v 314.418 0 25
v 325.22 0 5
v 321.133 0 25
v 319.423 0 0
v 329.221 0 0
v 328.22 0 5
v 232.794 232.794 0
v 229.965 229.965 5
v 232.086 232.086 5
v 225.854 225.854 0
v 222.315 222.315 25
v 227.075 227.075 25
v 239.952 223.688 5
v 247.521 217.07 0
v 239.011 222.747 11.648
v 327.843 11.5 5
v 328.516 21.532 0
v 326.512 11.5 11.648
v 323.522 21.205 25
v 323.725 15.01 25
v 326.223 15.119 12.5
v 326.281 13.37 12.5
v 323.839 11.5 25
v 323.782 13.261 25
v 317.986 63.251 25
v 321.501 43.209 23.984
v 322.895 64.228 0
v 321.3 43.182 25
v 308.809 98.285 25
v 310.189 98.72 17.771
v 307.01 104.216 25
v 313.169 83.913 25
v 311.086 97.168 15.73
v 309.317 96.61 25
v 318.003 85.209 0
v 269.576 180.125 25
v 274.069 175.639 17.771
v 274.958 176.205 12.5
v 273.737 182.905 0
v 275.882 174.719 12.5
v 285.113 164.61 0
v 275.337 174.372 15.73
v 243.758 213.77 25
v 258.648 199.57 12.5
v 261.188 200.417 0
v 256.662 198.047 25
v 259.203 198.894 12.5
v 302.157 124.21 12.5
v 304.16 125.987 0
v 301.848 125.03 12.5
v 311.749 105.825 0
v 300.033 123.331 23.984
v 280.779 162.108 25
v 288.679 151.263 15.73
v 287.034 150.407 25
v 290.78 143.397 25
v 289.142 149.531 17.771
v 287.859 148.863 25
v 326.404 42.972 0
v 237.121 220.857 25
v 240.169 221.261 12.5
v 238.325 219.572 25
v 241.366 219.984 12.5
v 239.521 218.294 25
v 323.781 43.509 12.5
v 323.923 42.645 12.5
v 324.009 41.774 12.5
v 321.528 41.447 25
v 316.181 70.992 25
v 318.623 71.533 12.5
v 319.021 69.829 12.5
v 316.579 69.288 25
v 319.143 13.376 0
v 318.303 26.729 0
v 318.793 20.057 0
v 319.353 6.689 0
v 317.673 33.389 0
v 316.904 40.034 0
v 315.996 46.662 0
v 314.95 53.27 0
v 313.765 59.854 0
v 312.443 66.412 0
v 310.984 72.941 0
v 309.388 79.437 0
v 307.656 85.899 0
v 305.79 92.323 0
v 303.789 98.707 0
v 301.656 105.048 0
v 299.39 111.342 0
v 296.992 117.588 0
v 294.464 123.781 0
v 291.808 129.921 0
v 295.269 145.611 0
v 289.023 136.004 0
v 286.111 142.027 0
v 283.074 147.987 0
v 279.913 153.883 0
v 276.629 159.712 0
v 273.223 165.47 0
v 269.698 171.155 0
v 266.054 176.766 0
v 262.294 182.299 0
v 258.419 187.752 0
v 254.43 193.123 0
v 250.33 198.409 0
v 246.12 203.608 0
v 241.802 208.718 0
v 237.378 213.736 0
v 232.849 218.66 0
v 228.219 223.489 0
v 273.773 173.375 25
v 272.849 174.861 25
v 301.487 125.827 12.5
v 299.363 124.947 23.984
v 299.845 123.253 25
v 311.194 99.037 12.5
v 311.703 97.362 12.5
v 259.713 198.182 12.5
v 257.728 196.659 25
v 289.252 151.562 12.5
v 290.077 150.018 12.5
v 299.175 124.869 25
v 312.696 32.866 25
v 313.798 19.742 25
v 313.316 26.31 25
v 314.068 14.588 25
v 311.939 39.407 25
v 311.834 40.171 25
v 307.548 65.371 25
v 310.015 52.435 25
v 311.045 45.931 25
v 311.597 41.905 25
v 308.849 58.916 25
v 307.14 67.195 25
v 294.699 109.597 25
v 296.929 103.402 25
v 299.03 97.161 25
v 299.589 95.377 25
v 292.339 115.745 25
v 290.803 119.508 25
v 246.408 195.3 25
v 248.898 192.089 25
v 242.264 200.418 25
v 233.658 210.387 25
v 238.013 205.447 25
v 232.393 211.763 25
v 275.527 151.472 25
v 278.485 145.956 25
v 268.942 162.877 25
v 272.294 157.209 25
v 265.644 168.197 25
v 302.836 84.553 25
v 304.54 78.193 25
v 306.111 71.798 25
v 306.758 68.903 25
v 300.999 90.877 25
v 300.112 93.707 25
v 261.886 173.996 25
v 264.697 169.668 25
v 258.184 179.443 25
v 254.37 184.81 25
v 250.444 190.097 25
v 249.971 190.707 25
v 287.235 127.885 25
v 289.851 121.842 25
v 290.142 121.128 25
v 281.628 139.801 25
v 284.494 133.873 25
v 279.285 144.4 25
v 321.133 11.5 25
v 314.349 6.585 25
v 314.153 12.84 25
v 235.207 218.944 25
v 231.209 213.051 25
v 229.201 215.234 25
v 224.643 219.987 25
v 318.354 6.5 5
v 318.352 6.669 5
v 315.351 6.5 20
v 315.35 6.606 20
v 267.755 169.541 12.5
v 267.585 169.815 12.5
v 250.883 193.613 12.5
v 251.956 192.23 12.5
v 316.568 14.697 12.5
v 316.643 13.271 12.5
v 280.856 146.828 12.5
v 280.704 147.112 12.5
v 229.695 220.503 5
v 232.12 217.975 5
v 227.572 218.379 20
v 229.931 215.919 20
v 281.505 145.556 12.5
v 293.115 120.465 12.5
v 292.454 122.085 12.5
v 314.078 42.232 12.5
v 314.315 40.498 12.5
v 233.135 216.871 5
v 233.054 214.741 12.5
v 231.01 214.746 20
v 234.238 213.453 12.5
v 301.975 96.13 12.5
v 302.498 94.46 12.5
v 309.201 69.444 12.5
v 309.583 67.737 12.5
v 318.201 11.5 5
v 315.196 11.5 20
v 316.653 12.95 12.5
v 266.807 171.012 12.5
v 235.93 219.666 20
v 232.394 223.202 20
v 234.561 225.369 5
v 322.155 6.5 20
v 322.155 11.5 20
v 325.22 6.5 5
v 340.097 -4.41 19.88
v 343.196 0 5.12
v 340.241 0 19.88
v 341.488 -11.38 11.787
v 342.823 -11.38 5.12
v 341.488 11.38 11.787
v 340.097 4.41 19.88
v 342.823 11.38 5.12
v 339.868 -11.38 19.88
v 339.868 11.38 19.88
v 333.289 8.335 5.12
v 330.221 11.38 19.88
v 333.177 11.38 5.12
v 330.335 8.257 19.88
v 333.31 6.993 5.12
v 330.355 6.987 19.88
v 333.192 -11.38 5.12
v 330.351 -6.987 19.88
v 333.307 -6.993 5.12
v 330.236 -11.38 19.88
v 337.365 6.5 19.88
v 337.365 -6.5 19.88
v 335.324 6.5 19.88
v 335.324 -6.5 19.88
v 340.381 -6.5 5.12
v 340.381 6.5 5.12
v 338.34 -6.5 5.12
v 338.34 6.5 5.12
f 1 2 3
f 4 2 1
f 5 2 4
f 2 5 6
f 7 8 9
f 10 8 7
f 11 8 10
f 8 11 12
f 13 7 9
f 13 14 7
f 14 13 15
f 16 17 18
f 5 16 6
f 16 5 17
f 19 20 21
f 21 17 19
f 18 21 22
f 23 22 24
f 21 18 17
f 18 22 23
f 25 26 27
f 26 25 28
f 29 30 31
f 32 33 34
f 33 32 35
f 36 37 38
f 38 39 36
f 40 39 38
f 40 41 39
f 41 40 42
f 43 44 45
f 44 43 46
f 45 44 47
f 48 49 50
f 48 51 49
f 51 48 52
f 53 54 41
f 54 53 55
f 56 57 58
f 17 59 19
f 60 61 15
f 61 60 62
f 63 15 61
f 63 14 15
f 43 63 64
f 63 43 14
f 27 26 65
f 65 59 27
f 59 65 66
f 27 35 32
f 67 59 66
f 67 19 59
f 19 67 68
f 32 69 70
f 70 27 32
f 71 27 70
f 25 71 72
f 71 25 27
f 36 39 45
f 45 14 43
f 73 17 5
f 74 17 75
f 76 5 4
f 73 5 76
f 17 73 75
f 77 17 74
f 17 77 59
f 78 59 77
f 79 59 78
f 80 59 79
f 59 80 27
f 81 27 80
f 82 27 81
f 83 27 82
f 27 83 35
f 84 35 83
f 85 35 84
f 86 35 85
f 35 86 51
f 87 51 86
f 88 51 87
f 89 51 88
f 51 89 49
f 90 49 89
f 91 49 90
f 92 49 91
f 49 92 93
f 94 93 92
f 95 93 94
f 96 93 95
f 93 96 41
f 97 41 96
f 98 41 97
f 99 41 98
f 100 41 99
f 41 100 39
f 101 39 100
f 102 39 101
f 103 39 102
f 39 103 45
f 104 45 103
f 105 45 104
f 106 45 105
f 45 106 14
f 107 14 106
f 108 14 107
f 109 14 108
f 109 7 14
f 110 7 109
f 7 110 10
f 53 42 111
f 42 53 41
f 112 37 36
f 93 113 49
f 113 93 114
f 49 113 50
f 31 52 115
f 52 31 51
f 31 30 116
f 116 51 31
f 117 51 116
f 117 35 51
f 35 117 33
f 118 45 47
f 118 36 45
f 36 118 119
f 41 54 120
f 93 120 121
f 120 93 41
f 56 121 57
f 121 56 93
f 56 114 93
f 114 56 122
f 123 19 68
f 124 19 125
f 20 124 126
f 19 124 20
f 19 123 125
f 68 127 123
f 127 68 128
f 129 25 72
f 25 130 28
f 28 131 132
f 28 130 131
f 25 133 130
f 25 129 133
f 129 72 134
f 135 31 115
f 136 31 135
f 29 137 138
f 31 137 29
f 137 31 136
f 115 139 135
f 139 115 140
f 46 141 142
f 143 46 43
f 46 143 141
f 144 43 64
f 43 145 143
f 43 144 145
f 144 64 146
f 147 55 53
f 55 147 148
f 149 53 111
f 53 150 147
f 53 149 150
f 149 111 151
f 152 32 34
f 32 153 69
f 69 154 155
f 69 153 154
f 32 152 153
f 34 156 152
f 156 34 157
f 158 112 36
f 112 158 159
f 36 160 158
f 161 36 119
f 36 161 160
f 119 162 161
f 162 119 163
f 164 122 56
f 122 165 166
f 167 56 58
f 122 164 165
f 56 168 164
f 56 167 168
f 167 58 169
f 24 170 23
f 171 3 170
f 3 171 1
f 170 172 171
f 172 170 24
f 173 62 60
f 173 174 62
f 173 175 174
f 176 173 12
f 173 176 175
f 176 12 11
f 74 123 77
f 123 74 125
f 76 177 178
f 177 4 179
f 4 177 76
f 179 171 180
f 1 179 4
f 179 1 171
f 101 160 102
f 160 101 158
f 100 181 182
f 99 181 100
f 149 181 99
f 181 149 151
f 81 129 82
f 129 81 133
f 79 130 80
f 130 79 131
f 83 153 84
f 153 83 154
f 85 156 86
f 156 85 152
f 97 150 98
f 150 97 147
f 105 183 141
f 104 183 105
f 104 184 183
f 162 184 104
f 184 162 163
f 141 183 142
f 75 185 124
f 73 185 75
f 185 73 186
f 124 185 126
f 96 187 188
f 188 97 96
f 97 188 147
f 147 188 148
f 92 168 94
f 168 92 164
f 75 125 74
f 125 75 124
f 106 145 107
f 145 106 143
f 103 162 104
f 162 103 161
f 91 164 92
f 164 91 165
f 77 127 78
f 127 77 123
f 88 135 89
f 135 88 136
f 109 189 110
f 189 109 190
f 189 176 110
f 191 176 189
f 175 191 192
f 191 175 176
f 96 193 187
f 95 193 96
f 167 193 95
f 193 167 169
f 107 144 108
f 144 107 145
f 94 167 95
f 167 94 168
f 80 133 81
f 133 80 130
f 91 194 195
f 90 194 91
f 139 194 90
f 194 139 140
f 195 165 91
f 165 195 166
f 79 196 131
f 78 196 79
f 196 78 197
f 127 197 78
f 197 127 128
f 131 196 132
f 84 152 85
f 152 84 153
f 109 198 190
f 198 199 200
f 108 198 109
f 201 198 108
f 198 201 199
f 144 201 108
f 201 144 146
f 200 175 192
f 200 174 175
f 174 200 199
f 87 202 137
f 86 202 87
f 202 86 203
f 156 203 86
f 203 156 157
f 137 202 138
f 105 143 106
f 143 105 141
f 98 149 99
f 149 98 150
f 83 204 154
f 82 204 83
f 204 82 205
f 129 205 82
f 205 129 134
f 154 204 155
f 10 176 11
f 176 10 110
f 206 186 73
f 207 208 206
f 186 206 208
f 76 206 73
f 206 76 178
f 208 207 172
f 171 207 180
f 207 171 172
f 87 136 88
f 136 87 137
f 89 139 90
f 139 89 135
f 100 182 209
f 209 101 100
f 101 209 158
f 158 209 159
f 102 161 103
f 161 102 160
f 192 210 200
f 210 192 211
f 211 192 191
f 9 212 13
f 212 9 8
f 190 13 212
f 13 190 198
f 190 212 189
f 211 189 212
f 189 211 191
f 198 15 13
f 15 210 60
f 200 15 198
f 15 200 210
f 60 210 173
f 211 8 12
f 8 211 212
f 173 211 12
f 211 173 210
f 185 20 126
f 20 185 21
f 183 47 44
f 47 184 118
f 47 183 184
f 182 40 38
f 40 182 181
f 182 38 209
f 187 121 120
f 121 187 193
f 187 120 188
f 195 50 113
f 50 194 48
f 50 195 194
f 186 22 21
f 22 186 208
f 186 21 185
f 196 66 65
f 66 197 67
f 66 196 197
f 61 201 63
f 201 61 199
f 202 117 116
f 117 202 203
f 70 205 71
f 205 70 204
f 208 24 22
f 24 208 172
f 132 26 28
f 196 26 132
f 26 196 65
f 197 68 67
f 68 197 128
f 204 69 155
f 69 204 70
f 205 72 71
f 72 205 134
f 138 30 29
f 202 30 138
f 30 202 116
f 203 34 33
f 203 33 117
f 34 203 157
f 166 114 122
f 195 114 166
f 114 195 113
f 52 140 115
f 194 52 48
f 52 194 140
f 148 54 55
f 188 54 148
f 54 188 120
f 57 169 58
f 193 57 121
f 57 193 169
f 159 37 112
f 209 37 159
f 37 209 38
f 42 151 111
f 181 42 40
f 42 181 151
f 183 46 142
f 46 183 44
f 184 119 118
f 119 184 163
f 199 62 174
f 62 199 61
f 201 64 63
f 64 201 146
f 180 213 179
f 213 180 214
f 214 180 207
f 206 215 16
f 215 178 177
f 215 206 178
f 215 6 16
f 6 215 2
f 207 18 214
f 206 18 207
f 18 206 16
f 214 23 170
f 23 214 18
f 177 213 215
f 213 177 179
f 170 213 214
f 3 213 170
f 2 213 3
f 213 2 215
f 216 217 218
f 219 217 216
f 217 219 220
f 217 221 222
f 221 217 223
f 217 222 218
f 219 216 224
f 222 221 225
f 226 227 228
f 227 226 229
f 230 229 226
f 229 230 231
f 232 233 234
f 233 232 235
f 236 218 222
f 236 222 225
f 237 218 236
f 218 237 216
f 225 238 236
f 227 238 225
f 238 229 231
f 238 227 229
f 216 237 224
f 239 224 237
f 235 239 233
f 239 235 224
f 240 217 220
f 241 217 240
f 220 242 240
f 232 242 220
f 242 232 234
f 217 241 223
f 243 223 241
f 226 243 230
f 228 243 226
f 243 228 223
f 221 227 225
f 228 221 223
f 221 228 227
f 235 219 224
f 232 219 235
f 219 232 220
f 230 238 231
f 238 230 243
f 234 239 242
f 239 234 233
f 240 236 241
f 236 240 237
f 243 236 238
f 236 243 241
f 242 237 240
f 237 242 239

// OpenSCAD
module cone(inclination, sweep, slice = [0, 200])
{
  rotate_extrude(angle = sweep)
  polygon(
    [
      [0, slice[0]],
      [slice[0] * sin(inclination), slice[0]],
      [slice[1] * sin(inclination), slice[1]],
      [0, slice[1]]
    ]);
}

inclination_x = 42.5;
inclination_y = 208;

inclination = atan2(inclination_x, inclination_y);

echo(str("Inclination: ", inclination_y, "x", inclination_x, " is ", inclination, " degrees"));

circumference_mm = 1990;
diameter_mm = circumference_mm / PI;
radius_mm = diameter_mm / 2;
//inclination = 15;
tack_count = 72;
segments = 8;
guide_thickness_mm = 10;
guide_height_mm = 25;
pin_slot_width_mm = 5;
pin_height_mm = 15;
pin_inset_mm = 6.5;
pin_thickness_mm = 3;
tack_shaft_diameter_mm = 1.75;
pin_tolerance_mm = 0.12;

segment_sweep = 360 / segments;
tacks_per_segment = floor(tack_count / segments);
tack_sweep = segment_sweep / tacks_per_segment;
radius_top_mm = radius_mm - guide_height_mm * 0.5 * sin(inclination);
radius_bottom_mm = radius_mm + guide_height_mm * 0.5 * sin(inclination);
cutaway_vertical_displacement_mm = guide_thickness_mm / tan(inclination);
slice_start = (radius_bottom_mm + guide_thickness_mm) / sin(inclination);
slice_end = (radius_top_mm + guide_thickness_mm) / sin(inclination);
tack_y_mm = radius_mm / tan(inclination) + cutaway_vertical_displacement_mm;
tack_shaft_radius_mm = tack_shaft_diameter_mm * 0.5;
pin_width_mm = 2 * (pin_inset_mm + pin_slot_width_mm);
pin_slot_y_mm = (guide_height_mm - pin_height_mm) * 0.5;

assert(tacks_per_segment * segments == tack_count, "Tack count does not divide evenly among segments.");

module guide_segment()
{
  difference()
  {
    // Base shape
    translate([0, 0, slice_start])
    scale([1, 1, -1])
    difference()
    {
      cone(inclination, segment_sweep, [slice_start, slice_end], $fn = 100);
      
      translate([0, 0, cutaway_vertical_displacement_mm])
      cone(inclination, 360, [0, tack_y_mm * 2], $fn = 300);
    }

    // Pinning slots
    translate([0, pin_inset_mm, (guide_height_mm - pin_height_mm) * 0.5])
    cube([diameter_mm, pin_slot_width_mm, pin_height_mm]);

    translate([radius_bottom_mm + guide_thickness_mm - pin_thickness_mm - pin_slot_y_mm * sin(inclination), 0, (guide_height_mm - pin_height_mm) / 2])
    rotate([0, -inclination, 0])
    cube([pin_thickness_mm + 5, pin_slot_width_mm + pin_inset_mm, guide_height_mm]);

    translate([radius_bottom_mm + guide_thickness_mm - pin_thickness_mm - pin_slot_y_mm * sin(inclination), 0, (guide_height_mm - pin_height_mm) / 2])
    cube([pin_thickness_mm + 5, pin_slot_width_mm + pin_inset_mm, guide_height_mm]);
    
    rotate([0, 0, segment_sweep])
    {
      translate([0, -pin_inset_mm - pin_slot_width_mm, (guide_height_mm - pin_height_mm) * 0.5])
      cube([diameter_mm, pin_slot_width_mm, pin_height_mm]);

      translate([radius_bottom_mm + guide_thickness_mm - pin_thickness_mm - pin_slot_y_mm * sin(inclination), -pin_inset_mm - pin_slot_width_mm, (guide_height_mm - pin_height_mm) / 2])
      rotate([0, -inclination, 0])
      cube([pin_thickness_mm + 5, pin_slot_width_mm + pin_inset_mm, guide_height_mm]);

      translate([radius_bottom_mm + guide_thickness_mm - pin_thickness_mm - pin_slot_y_mm * sin(inclination), -pin_inset_mm - pin_slot_width_mm, (guide_height_mm - pin_height_mm) / 2])
      cube([pin_thickness_mm + 5, pin_slot_width_mm + pin_inset_mm, guide_height_mm]);
    }

    // Tack shaft channels
    for (tack = [1 : tacks_per_segment])
    {
      translate([0, 0, guide_height_mm / 2])
      scale([1, 1, guide_height_mm])
      translate([0, 0, tack_shaft_radius_mm])
      rotate([0, 0, tack * tack_sweep - tack_sweep * 0.5])
      rotate([0, 90, 0])
      rotate([0, 0, 45])
      cylinder(radius_mm * 1.2, r = tack_shaft_radius_mm * sqrt(2), $fn = 4);
    }
  }
}

module pin()
{
  difference()
  {
    intersection()
    {
      rotate([0, 0, -segment_sweep * 0.5])
      translate([0, 0, slice_start])
      scale([1, 1, -1])
      difference()
      {
        cone(inclination, segment_sweep, [slice_start, slice_end], $fn = 100);
        
        translate([0, 0, cutaway_vertical_displacement_mm])
        cone(inclination, 360, [0, tack_y_mm * 2], $fn = 300);
      }
      
      translate([0, pin_tolerance_mm - pin_width_mm / 2, pin_slot_y_mm + pin_tolerance_mm])
      cube([diameter_mm, pin_width_mm - 2 * pin_tolerance_mm, pin_height_mm - 2 * pin_tolerance_mm]);
    }

    translate([radius_bottom_mm - pin_thickness_mm, -pin_inset_mm, 0])
    rotate([0, -inclination, 0])
    cube([guide_thickness_mm, 2 * pin_inset_mm, guide_height_mm * 2]);

    // Angled edges to ease insertion
    for (angle_bias = [-1, 1])
    {
      translate([radius_bottom_mm - pin_thickness_mm, -pin_inset_mm, 0])
      rotate([0, -inclination, 0])
      translate([guide_thickness_mm * 0.8, 0, 0])
      multmatrix(
        [[1, 0, 0, 0],
         [0.1 * angle_bias, 1, 0, 0],
         [0, 0, 1, 0],
         [0, 0, 0, 1]])
      translate([-guide_thickness_mm, 0, 0])
      cube([guide_thickness_mm, 2 * pin_inset_mm, guide_height_mm * 2]);
    }
  }
}

guide_segment();

translate([15, 0, 0])
pin();
